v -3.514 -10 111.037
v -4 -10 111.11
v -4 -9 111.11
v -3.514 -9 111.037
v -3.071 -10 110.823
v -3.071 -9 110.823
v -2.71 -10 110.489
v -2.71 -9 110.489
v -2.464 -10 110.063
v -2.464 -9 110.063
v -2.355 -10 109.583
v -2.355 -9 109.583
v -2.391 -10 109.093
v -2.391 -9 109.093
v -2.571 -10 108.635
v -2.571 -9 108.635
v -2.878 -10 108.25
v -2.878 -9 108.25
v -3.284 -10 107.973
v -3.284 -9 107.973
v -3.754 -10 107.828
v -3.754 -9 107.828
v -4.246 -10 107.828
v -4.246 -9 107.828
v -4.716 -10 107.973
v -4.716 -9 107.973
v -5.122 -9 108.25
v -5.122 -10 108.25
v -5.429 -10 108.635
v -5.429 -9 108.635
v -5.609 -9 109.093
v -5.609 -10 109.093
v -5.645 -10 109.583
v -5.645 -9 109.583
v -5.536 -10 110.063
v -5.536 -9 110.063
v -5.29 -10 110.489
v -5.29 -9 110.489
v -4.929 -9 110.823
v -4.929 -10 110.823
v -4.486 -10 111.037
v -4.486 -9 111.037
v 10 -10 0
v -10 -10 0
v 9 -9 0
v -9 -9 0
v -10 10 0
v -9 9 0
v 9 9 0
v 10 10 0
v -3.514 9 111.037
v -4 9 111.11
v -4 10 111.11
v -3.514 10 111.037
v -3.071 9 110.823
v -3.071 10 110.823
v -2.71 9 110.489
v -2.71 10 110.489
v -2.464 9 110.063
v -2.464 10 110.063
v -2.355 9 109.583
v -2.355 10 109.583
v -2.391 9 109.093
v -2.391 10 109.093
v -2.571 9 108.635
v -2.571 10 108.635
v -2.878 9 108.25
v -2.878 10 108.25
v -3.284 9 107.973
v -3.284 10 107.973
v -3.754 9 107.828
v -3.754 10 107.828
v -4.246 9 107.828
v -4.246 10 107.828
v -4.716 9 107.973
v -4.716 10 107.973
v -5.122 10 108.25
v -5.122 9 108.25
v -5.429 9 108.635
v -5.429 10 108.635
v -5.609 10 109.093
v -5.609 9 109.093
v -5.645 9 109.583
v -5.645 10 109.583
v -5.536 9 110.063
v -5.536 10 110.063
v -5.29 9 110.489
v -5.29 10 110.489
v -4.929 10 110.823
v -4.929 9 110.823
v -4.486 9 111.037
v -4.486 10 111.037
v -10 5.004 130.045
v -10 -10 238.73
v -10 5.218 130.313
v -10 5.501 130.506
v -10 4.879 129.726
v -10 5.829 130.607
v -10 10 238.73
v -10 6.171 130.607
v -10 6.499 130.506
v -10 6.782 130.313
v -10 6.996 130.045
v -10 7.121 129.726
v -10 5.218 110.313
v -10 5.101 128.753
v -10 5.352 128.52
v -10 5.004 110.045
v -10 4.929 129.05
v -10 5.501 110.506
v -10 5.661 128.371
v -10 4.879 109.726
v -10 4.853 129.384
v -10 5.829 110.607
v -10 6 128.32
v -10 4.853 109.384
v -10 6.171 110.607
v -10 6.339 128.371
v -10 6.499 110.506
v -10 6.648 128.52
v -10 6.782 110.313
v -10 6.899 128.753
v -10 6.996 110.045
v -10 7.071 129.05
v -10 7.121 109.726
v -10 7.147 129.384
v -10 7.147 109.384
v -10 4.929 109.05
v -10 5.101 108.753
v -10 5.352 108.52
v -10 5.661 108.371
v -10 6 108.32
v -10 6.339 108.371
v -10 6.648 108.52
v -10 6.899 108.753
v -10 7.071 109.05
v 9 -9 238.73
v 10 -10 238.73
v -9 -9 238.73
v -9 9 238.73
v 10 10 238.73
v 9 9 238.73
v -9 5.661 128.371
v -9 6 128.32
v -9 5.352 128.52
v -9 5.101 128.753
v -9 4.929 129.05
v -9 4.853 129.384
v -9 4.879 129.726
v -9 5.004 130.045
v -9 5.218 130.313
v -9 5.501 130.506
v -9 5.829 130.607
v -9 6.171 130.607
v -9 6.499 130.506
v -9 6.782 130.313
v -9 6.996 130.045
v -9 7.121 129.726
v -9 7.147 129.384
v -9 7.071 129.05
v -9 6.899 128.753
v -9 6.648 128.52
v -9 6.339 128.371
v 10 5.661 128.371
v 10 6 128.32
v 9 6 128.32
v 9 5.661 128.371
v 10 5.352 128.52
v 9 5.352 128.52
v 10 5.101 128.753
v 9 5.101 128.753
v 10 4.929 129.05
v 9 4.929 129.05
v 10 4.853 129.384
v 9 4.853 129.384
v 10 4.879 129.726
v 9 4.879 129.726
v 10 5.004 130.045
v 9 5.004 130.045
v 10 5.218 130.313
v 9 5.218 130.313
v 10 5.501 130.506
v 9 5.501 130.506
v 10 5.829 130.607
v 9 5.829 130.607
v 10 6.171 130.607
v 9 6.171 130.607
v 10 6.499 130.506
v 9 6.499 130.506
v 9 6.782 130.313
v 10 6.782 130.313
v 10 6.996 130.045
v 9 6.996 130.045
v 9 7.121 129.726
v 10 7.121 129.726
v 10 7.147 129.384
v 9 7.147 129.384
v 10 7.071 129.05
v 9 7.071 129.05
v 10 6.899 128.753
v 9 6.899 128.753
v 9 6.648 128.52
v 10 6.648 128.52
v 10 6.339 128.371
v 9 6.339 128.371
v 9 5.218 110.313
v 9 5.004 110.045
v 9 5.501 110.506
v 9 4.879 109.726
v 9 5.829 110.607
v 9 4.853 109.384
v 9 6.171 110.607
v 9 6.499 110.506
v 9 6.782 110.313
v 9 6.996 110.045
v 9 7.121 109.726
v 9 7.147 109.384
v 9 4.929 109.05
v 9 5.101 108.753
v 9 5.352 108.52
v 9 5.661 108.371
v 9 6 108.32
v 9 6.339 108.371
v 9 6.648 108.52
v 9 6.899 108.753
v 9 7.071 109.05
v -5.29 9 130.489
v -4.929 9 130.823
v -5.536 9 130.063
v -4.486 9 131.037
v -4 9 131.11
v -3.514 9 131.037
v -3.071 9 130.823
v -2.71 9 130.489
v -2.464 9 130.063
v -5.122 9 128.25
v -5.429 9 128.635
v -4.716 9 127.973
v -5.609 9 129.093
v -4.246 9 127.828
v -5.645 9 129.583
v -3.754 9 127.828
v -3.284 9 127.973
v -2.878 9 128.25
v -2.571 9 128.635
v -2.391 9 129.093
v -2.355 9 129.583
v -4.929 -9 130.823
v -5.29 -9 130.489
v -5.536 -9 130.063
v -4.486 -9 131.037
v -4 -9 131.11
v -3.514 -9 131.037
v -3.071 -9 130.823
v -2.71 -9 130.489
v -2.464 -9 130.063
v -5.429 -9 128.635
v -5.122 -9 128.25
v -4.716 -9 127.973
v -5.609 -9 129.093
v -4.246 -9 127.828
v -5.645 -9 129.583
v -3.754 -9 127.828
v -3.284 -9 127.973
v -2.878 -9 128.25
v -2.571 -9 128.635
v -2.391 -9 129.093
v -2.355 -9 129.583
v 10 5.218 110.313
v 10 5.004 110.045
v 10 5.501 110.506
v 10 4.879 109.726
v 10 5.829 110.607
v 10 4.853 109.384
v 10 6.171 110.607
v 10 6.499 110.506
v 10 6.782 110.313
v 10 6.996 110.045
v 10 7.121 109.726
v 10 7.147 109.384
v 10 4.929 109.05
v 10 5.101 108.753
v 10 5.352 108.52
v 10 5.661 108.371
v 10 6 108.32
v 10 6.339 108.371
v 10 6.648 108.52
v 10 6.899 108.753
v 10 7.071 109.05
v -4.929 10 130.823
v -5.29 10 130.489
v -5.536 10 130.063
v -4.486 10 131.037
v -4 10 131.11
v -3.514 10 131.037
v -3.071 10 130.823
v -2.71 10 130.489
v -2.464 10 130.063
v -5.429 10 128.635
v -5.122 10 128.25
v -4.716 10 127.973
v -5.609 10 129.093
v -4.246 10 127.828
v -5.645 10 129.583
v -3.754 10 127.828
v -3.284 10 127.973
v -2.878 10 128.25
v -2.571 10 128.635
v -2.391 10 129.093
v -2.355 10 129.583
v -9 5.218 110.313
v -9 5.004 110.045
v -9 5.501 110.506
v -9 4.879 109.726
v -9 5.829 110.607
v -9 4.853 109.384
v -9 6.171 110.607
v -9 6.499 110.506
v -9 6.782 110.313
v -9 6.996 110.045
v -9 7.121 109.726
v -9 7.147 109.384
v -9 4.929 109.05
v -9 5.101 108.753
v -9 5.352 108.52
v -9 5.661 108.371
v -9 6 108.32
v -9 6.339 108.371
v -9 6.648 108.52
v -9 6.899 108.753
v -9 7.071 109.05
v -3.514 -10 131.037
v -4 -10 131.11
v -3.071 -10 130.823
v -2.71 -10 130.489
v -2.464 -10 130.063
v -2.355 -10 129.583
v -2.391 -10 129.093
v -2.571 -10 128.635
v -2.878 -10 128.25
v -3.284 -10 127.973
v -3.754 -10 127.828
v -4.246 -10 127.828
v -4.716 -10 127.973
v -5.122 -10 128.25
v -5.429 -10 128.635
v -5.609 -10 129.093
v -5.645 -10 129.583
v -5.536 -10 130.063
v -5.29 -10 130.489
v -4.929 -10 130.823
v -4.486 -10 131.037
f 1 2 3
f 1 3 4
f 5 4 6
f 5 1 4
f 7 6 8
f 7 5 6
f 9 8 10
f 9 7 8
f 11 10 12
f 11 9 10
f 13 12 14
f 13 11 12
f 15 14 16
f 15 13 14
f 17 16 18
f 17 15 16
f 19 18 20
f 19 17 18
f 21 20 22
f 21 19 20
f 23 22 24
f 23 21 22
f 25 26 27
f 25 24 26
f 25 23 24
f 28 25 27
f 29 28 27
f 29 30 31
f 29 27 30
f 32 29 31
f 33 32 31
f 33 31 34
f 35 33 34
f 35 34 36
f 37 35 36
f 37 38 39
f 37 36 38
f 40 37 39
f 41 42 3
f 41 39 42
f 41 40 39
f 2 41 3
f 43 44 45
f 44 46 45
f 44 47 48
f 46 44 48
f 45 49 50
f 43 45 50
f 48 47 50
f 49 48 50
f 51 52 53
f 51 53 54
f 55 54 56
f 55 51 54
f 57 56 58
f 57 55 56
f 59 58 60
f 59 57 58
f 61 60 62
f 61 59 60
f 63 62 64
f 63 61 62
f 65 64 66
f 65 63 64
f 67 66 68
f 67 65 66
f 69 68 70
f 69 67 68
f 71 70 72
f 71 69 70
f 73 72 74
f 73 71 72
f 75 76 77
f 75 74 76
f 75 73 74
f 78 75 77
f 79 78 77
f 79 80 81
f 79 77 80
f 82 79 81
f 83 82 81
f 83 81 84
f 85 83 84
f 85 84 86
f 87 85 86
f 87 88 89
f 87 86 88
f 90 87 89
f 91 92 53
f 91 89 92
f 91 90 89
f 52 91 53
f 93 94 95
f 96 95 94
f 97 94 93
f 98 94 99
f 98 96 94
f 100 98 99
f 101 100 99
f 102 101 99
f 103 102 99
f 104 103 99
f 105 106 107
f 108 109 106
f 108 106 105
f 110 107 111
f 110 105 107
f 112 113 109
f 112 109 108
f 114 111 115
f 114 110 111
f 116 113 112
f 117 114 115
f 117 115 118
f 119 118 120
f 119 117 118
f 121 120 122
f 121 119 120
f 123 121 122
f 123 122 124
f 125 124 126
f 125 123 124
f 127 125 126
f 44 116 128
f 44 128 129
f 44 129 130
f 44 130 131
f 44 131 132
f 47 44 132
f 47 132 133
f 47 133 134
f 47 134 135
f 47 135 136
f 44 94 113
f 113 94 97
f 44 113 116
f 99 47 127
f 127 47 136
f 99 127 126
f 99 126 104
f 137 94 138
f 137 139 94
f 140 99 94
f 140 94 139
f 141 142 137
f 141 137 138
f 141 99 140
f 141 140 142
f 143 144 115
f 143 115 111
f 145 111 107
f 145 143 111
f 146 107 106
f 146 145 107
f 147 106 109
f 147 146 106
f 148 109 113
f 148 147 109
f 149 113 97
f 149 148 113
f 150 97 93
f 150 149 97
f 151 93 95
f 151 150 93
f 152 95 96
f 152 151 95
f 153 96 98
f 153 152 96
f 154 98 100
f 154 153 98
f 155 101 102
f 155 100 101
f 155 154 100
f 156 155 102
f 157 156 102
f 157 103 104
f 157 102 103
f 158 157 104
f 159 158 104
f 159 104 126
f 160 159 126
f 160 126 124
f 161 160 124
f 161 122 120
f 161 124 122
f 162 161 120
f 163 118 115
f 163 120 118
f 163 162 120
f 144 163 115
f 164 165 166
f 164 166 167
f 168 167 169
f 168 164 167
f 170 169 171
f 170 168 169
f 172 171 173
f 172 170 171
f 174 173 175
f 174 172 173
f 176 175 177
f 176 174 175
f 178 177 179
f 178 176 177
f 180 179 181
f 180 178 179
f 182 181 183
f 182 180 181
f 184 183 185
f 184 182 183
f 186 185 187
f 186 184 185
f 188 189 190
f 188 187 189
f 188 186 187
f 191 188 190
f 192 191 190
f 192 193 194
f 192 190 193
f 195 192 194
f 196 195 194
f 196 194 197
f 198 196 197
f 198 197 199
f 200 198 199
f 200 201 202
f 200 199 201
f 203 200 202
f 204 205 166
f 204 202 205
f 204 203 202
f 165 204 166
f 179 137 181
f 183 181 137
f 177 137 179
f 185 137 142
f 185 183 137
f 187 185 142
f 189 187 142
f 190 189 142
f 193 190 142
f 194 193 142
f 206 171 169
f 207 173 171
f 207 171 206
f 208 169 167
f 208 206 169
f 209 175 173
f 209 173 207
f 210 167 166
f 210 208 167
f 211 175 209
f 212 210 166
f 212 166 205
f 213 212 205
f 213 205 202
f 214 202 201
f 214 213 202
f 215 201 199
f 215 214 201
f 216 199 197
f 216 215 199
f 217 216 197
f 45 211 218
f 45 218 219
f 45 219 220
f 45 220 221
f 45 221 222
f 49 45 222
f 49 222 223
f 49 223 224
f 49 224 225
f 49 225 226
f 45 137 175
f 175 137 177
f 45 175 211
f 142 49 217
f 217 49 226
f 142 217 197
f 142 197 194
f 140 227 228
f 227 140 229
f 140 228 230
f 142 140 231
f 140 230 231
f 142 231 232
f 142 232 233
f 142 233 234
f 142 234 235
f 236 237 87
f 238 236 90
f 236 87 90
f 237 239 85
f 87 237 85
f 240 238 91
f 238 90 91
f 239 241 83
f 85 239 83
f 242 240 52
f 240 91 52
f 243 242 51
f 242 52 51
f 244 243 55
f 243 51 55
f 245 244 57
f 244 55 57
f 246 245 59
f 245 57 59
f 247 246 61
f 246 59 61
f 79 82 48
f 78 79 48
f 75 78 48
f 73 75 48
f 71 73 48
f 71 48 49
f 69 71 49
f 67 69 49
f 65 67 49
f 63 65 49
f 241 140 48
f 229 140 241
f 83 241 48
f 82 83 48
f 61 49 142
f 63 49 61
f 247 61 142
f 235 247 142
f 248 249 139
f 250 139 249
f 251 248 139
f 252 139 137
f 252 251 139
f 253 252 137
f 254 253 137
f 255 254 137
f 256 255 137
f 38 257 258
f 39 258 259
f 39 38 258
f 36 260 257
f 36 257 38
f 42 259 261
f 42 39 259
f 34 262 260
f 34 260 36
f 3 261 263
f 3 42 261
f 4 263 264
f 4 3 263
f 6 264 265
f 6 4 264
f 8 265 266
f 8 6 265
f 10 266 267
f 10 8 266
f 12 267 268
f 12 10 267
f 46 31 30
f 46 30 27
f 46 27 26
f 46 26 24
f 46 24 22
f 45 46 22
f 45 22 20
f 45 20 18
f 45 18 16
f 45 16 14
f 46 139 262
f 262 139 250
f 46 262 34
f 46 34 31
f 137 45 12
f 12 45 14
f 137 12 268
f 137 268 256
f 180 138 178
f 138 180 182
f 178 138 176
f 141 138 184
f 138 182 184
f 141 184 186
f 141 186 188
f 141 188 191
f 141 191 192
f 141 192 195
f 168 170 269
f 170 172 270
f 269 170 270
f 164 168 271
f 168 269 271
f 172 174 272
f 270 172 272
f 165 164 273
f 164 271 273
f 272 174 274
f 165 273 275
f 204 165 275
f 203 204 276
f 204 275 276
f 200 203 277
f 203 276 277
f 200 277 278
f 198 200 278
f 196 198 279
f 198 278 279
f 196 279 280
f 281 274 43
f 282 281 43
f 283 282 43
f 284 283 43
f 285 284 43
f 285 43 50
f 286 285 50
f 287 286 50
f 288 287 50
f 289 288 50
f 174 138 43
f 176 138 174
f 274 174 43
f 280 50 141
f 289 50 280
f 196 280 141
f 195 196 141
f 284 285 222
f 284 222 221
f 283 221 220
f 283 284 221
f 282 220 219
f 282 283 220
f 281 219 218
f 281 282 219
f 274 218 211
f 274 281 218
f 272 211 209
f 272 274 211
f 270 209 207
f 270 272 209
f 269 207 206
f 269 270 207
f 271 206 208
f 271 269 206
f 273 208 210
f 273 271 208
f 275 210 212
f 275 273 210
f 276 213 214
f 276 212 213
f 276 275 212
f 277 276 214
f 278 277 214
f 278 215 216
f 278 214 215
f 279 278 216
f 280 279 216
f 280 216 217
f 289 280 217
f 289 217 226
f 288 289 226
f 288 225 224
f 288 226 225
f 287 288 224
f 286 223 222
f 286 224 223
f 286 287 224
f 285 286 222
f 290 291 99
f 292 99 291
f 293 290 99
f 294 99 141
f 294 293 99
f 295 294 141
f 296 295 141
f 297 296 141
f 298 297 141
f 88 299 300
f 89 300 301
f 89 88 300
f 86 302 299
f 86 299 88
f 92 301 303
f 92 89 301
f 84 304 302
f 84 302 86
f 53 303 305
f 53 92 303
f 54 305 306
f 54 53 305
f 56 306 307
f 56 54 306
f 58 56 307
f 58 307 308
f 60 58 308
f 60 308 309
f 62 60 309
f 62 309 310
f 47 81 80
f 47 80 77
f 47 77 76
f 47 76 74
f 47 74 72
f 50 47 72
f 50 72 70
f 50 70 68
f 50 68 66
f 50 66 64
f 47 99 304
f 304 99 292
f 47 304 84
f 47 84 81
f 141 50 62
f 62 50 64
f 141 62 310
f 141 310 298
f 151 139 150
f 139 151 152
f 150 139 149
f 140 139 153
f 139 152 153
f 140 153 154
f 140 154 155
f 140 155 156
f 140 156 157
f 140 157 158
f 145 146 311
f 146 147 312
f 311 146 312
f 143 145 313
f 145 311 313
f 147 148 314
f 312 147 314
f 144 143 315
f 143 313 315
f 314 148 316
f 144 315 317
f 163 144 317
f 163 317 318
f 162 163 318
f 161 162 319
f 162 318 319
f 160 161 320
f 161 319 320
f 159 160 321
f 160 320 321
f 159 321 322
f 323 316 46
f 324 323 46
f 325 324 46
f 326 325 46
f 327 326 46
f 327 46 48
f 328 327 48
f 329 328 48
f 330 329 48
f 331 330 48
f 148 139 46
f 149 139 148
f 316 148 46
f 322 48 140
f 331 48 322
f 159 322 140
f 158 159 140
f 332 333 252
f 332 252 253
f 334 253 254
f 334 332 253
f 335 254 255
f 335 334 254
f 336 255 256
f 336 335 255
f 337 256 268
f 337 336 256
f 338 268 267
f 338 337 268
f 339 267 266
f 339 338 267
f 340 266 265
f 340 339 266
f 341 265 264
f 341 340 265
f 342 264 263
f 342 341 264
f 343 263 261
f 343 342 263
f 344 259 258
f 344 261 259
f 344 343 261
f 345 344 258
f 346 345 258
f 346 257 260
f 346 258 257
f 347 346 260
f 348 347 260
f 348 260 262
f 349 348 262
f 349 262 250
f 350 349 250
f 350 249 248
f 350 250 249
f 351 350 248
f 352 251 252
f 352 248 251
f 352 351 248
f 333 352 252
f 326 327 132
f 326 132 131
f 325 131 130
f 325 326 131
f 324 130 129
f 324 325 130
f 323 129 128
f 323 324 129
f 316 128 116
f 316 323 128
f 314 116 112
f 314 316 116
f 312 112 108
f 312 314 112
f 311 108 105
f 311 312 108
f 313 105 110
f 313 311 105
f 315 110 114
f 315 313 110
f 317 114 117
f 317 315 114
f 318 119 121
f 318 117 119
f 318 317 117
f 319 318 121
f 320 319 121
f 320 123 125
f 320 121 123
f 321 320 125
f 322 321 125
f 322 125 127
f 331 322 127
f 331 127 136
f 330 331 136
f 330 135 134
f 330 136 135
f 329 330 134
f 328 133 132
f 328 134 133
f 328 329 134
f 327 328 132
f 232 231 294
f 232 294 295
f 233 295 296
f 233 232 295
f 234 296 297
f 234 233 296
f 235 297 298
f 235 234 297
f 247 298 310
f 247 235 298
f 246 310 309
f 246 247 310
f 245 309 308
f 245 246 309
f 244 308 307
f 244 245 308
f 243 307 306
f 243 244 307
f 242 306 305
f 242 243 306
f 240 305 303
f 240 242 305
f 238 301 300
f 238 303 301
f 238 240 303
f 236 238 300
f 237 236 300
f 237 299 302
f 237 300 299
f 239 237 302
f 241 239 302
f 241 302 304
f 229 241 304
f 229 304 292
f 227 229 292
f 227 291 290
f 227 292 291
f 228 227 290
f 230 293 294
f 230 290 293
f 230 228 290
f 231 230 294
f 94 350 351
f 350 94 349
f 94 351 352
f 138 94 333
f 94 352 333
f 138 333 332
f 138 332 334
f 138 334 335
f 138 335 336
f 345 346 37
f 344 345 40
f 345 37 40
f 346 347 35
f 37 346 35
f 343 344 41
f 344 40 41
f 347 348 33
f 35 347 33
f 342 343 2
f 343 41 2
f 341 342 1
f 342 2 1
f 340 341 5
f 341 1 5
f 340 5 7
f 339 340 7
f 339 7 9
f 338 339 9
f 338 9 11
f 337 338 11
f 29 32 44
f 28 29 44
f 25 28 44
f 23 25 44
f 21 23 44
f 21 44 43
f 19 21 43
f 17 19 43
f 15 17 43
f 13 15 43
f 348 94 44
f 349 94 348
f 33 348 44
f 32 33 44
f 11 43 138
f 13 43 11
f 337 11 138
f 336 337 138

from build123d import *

# Parameters (mm, degrees)
SKETCH1_W               = 20
SKETCH1_H               = 20
SKETCH1_W_2             = 18
SKETCH1_H_2             = 18
BOSS_EXTRUDE2_DEPTH     = 238.73
CUT_EXTRUDE1_DEPTH      = 240.774921332
CUT_EXTRUDE1_DEPTH_BACK = 240.774921332
SKETCH3_R               = 1.65
CUT_EXTRUDE2_DEPTH      = 240.774921332
CUT_EXTRUDE2_DEPTH_BACK = 240.774921332
SKETCH4_R               = 1.15


with BuildPart() as part:
    # Sketch1 → Boss-Extrude2 (new body)
    with BuildSketch(Plane.XY):
        Rectangle(SKETCH1_W, SKETCH1_H)
        Rectangle(SKETCH1_W_2, SKETCH1_H_2, mode=Mode.SUBTRACT)
    extrude(amount=BOSS_EXTRUDE2_DEPTH)

    # Sketch3 → Cut-Extrude1 (cut, two sides: drawn at the far end of the back side and taken through both)
    with BuildSketch(Plane(origin=(0, 10, 0), x_dir=(1, 0, 0), z_dir=(0, 1, 0)).offset(-CUT_EXTRUDE1_DEPTH_BACK)):
        with Locations(Location((-4, -109.46, 0), (0, 0, 270))):
            Circle(SKETCH3_R)
        with Locations(Location((-4, -129.46, 0), (0, 0, 270))):
            Circle(SKETCH3_R)
    extrude(amount=CUT_EXTRUDE1_DEPTH + CUT_EXTRUDE1_DEPTH_BACK, mode=Mode.SUBTRACT)

    # Sketch4 → Cut-Extrude2 (cut, two sides: drawn at the far end of the back side and taken through both)
    with BuildSketch(Plane.ZY.offset(10).offset(-CUT_EXTRUDE2_DEPTH_BACK)):
        with Locations(Location((129.47, 6, 0), (0, 0, 180))):
            Circle(SKETCH4_R)
        with Locations(Location((109.47, 6, 0), (0, 0, 180))):
            Circle(SKETCH4_R)
    extrude(amount=CUT_EXTRUDE2_DEPTH + CUT_EXTRUDE2_DEPTH_BACK, mode=Mode.SUBTRACT)


solid = part.part
